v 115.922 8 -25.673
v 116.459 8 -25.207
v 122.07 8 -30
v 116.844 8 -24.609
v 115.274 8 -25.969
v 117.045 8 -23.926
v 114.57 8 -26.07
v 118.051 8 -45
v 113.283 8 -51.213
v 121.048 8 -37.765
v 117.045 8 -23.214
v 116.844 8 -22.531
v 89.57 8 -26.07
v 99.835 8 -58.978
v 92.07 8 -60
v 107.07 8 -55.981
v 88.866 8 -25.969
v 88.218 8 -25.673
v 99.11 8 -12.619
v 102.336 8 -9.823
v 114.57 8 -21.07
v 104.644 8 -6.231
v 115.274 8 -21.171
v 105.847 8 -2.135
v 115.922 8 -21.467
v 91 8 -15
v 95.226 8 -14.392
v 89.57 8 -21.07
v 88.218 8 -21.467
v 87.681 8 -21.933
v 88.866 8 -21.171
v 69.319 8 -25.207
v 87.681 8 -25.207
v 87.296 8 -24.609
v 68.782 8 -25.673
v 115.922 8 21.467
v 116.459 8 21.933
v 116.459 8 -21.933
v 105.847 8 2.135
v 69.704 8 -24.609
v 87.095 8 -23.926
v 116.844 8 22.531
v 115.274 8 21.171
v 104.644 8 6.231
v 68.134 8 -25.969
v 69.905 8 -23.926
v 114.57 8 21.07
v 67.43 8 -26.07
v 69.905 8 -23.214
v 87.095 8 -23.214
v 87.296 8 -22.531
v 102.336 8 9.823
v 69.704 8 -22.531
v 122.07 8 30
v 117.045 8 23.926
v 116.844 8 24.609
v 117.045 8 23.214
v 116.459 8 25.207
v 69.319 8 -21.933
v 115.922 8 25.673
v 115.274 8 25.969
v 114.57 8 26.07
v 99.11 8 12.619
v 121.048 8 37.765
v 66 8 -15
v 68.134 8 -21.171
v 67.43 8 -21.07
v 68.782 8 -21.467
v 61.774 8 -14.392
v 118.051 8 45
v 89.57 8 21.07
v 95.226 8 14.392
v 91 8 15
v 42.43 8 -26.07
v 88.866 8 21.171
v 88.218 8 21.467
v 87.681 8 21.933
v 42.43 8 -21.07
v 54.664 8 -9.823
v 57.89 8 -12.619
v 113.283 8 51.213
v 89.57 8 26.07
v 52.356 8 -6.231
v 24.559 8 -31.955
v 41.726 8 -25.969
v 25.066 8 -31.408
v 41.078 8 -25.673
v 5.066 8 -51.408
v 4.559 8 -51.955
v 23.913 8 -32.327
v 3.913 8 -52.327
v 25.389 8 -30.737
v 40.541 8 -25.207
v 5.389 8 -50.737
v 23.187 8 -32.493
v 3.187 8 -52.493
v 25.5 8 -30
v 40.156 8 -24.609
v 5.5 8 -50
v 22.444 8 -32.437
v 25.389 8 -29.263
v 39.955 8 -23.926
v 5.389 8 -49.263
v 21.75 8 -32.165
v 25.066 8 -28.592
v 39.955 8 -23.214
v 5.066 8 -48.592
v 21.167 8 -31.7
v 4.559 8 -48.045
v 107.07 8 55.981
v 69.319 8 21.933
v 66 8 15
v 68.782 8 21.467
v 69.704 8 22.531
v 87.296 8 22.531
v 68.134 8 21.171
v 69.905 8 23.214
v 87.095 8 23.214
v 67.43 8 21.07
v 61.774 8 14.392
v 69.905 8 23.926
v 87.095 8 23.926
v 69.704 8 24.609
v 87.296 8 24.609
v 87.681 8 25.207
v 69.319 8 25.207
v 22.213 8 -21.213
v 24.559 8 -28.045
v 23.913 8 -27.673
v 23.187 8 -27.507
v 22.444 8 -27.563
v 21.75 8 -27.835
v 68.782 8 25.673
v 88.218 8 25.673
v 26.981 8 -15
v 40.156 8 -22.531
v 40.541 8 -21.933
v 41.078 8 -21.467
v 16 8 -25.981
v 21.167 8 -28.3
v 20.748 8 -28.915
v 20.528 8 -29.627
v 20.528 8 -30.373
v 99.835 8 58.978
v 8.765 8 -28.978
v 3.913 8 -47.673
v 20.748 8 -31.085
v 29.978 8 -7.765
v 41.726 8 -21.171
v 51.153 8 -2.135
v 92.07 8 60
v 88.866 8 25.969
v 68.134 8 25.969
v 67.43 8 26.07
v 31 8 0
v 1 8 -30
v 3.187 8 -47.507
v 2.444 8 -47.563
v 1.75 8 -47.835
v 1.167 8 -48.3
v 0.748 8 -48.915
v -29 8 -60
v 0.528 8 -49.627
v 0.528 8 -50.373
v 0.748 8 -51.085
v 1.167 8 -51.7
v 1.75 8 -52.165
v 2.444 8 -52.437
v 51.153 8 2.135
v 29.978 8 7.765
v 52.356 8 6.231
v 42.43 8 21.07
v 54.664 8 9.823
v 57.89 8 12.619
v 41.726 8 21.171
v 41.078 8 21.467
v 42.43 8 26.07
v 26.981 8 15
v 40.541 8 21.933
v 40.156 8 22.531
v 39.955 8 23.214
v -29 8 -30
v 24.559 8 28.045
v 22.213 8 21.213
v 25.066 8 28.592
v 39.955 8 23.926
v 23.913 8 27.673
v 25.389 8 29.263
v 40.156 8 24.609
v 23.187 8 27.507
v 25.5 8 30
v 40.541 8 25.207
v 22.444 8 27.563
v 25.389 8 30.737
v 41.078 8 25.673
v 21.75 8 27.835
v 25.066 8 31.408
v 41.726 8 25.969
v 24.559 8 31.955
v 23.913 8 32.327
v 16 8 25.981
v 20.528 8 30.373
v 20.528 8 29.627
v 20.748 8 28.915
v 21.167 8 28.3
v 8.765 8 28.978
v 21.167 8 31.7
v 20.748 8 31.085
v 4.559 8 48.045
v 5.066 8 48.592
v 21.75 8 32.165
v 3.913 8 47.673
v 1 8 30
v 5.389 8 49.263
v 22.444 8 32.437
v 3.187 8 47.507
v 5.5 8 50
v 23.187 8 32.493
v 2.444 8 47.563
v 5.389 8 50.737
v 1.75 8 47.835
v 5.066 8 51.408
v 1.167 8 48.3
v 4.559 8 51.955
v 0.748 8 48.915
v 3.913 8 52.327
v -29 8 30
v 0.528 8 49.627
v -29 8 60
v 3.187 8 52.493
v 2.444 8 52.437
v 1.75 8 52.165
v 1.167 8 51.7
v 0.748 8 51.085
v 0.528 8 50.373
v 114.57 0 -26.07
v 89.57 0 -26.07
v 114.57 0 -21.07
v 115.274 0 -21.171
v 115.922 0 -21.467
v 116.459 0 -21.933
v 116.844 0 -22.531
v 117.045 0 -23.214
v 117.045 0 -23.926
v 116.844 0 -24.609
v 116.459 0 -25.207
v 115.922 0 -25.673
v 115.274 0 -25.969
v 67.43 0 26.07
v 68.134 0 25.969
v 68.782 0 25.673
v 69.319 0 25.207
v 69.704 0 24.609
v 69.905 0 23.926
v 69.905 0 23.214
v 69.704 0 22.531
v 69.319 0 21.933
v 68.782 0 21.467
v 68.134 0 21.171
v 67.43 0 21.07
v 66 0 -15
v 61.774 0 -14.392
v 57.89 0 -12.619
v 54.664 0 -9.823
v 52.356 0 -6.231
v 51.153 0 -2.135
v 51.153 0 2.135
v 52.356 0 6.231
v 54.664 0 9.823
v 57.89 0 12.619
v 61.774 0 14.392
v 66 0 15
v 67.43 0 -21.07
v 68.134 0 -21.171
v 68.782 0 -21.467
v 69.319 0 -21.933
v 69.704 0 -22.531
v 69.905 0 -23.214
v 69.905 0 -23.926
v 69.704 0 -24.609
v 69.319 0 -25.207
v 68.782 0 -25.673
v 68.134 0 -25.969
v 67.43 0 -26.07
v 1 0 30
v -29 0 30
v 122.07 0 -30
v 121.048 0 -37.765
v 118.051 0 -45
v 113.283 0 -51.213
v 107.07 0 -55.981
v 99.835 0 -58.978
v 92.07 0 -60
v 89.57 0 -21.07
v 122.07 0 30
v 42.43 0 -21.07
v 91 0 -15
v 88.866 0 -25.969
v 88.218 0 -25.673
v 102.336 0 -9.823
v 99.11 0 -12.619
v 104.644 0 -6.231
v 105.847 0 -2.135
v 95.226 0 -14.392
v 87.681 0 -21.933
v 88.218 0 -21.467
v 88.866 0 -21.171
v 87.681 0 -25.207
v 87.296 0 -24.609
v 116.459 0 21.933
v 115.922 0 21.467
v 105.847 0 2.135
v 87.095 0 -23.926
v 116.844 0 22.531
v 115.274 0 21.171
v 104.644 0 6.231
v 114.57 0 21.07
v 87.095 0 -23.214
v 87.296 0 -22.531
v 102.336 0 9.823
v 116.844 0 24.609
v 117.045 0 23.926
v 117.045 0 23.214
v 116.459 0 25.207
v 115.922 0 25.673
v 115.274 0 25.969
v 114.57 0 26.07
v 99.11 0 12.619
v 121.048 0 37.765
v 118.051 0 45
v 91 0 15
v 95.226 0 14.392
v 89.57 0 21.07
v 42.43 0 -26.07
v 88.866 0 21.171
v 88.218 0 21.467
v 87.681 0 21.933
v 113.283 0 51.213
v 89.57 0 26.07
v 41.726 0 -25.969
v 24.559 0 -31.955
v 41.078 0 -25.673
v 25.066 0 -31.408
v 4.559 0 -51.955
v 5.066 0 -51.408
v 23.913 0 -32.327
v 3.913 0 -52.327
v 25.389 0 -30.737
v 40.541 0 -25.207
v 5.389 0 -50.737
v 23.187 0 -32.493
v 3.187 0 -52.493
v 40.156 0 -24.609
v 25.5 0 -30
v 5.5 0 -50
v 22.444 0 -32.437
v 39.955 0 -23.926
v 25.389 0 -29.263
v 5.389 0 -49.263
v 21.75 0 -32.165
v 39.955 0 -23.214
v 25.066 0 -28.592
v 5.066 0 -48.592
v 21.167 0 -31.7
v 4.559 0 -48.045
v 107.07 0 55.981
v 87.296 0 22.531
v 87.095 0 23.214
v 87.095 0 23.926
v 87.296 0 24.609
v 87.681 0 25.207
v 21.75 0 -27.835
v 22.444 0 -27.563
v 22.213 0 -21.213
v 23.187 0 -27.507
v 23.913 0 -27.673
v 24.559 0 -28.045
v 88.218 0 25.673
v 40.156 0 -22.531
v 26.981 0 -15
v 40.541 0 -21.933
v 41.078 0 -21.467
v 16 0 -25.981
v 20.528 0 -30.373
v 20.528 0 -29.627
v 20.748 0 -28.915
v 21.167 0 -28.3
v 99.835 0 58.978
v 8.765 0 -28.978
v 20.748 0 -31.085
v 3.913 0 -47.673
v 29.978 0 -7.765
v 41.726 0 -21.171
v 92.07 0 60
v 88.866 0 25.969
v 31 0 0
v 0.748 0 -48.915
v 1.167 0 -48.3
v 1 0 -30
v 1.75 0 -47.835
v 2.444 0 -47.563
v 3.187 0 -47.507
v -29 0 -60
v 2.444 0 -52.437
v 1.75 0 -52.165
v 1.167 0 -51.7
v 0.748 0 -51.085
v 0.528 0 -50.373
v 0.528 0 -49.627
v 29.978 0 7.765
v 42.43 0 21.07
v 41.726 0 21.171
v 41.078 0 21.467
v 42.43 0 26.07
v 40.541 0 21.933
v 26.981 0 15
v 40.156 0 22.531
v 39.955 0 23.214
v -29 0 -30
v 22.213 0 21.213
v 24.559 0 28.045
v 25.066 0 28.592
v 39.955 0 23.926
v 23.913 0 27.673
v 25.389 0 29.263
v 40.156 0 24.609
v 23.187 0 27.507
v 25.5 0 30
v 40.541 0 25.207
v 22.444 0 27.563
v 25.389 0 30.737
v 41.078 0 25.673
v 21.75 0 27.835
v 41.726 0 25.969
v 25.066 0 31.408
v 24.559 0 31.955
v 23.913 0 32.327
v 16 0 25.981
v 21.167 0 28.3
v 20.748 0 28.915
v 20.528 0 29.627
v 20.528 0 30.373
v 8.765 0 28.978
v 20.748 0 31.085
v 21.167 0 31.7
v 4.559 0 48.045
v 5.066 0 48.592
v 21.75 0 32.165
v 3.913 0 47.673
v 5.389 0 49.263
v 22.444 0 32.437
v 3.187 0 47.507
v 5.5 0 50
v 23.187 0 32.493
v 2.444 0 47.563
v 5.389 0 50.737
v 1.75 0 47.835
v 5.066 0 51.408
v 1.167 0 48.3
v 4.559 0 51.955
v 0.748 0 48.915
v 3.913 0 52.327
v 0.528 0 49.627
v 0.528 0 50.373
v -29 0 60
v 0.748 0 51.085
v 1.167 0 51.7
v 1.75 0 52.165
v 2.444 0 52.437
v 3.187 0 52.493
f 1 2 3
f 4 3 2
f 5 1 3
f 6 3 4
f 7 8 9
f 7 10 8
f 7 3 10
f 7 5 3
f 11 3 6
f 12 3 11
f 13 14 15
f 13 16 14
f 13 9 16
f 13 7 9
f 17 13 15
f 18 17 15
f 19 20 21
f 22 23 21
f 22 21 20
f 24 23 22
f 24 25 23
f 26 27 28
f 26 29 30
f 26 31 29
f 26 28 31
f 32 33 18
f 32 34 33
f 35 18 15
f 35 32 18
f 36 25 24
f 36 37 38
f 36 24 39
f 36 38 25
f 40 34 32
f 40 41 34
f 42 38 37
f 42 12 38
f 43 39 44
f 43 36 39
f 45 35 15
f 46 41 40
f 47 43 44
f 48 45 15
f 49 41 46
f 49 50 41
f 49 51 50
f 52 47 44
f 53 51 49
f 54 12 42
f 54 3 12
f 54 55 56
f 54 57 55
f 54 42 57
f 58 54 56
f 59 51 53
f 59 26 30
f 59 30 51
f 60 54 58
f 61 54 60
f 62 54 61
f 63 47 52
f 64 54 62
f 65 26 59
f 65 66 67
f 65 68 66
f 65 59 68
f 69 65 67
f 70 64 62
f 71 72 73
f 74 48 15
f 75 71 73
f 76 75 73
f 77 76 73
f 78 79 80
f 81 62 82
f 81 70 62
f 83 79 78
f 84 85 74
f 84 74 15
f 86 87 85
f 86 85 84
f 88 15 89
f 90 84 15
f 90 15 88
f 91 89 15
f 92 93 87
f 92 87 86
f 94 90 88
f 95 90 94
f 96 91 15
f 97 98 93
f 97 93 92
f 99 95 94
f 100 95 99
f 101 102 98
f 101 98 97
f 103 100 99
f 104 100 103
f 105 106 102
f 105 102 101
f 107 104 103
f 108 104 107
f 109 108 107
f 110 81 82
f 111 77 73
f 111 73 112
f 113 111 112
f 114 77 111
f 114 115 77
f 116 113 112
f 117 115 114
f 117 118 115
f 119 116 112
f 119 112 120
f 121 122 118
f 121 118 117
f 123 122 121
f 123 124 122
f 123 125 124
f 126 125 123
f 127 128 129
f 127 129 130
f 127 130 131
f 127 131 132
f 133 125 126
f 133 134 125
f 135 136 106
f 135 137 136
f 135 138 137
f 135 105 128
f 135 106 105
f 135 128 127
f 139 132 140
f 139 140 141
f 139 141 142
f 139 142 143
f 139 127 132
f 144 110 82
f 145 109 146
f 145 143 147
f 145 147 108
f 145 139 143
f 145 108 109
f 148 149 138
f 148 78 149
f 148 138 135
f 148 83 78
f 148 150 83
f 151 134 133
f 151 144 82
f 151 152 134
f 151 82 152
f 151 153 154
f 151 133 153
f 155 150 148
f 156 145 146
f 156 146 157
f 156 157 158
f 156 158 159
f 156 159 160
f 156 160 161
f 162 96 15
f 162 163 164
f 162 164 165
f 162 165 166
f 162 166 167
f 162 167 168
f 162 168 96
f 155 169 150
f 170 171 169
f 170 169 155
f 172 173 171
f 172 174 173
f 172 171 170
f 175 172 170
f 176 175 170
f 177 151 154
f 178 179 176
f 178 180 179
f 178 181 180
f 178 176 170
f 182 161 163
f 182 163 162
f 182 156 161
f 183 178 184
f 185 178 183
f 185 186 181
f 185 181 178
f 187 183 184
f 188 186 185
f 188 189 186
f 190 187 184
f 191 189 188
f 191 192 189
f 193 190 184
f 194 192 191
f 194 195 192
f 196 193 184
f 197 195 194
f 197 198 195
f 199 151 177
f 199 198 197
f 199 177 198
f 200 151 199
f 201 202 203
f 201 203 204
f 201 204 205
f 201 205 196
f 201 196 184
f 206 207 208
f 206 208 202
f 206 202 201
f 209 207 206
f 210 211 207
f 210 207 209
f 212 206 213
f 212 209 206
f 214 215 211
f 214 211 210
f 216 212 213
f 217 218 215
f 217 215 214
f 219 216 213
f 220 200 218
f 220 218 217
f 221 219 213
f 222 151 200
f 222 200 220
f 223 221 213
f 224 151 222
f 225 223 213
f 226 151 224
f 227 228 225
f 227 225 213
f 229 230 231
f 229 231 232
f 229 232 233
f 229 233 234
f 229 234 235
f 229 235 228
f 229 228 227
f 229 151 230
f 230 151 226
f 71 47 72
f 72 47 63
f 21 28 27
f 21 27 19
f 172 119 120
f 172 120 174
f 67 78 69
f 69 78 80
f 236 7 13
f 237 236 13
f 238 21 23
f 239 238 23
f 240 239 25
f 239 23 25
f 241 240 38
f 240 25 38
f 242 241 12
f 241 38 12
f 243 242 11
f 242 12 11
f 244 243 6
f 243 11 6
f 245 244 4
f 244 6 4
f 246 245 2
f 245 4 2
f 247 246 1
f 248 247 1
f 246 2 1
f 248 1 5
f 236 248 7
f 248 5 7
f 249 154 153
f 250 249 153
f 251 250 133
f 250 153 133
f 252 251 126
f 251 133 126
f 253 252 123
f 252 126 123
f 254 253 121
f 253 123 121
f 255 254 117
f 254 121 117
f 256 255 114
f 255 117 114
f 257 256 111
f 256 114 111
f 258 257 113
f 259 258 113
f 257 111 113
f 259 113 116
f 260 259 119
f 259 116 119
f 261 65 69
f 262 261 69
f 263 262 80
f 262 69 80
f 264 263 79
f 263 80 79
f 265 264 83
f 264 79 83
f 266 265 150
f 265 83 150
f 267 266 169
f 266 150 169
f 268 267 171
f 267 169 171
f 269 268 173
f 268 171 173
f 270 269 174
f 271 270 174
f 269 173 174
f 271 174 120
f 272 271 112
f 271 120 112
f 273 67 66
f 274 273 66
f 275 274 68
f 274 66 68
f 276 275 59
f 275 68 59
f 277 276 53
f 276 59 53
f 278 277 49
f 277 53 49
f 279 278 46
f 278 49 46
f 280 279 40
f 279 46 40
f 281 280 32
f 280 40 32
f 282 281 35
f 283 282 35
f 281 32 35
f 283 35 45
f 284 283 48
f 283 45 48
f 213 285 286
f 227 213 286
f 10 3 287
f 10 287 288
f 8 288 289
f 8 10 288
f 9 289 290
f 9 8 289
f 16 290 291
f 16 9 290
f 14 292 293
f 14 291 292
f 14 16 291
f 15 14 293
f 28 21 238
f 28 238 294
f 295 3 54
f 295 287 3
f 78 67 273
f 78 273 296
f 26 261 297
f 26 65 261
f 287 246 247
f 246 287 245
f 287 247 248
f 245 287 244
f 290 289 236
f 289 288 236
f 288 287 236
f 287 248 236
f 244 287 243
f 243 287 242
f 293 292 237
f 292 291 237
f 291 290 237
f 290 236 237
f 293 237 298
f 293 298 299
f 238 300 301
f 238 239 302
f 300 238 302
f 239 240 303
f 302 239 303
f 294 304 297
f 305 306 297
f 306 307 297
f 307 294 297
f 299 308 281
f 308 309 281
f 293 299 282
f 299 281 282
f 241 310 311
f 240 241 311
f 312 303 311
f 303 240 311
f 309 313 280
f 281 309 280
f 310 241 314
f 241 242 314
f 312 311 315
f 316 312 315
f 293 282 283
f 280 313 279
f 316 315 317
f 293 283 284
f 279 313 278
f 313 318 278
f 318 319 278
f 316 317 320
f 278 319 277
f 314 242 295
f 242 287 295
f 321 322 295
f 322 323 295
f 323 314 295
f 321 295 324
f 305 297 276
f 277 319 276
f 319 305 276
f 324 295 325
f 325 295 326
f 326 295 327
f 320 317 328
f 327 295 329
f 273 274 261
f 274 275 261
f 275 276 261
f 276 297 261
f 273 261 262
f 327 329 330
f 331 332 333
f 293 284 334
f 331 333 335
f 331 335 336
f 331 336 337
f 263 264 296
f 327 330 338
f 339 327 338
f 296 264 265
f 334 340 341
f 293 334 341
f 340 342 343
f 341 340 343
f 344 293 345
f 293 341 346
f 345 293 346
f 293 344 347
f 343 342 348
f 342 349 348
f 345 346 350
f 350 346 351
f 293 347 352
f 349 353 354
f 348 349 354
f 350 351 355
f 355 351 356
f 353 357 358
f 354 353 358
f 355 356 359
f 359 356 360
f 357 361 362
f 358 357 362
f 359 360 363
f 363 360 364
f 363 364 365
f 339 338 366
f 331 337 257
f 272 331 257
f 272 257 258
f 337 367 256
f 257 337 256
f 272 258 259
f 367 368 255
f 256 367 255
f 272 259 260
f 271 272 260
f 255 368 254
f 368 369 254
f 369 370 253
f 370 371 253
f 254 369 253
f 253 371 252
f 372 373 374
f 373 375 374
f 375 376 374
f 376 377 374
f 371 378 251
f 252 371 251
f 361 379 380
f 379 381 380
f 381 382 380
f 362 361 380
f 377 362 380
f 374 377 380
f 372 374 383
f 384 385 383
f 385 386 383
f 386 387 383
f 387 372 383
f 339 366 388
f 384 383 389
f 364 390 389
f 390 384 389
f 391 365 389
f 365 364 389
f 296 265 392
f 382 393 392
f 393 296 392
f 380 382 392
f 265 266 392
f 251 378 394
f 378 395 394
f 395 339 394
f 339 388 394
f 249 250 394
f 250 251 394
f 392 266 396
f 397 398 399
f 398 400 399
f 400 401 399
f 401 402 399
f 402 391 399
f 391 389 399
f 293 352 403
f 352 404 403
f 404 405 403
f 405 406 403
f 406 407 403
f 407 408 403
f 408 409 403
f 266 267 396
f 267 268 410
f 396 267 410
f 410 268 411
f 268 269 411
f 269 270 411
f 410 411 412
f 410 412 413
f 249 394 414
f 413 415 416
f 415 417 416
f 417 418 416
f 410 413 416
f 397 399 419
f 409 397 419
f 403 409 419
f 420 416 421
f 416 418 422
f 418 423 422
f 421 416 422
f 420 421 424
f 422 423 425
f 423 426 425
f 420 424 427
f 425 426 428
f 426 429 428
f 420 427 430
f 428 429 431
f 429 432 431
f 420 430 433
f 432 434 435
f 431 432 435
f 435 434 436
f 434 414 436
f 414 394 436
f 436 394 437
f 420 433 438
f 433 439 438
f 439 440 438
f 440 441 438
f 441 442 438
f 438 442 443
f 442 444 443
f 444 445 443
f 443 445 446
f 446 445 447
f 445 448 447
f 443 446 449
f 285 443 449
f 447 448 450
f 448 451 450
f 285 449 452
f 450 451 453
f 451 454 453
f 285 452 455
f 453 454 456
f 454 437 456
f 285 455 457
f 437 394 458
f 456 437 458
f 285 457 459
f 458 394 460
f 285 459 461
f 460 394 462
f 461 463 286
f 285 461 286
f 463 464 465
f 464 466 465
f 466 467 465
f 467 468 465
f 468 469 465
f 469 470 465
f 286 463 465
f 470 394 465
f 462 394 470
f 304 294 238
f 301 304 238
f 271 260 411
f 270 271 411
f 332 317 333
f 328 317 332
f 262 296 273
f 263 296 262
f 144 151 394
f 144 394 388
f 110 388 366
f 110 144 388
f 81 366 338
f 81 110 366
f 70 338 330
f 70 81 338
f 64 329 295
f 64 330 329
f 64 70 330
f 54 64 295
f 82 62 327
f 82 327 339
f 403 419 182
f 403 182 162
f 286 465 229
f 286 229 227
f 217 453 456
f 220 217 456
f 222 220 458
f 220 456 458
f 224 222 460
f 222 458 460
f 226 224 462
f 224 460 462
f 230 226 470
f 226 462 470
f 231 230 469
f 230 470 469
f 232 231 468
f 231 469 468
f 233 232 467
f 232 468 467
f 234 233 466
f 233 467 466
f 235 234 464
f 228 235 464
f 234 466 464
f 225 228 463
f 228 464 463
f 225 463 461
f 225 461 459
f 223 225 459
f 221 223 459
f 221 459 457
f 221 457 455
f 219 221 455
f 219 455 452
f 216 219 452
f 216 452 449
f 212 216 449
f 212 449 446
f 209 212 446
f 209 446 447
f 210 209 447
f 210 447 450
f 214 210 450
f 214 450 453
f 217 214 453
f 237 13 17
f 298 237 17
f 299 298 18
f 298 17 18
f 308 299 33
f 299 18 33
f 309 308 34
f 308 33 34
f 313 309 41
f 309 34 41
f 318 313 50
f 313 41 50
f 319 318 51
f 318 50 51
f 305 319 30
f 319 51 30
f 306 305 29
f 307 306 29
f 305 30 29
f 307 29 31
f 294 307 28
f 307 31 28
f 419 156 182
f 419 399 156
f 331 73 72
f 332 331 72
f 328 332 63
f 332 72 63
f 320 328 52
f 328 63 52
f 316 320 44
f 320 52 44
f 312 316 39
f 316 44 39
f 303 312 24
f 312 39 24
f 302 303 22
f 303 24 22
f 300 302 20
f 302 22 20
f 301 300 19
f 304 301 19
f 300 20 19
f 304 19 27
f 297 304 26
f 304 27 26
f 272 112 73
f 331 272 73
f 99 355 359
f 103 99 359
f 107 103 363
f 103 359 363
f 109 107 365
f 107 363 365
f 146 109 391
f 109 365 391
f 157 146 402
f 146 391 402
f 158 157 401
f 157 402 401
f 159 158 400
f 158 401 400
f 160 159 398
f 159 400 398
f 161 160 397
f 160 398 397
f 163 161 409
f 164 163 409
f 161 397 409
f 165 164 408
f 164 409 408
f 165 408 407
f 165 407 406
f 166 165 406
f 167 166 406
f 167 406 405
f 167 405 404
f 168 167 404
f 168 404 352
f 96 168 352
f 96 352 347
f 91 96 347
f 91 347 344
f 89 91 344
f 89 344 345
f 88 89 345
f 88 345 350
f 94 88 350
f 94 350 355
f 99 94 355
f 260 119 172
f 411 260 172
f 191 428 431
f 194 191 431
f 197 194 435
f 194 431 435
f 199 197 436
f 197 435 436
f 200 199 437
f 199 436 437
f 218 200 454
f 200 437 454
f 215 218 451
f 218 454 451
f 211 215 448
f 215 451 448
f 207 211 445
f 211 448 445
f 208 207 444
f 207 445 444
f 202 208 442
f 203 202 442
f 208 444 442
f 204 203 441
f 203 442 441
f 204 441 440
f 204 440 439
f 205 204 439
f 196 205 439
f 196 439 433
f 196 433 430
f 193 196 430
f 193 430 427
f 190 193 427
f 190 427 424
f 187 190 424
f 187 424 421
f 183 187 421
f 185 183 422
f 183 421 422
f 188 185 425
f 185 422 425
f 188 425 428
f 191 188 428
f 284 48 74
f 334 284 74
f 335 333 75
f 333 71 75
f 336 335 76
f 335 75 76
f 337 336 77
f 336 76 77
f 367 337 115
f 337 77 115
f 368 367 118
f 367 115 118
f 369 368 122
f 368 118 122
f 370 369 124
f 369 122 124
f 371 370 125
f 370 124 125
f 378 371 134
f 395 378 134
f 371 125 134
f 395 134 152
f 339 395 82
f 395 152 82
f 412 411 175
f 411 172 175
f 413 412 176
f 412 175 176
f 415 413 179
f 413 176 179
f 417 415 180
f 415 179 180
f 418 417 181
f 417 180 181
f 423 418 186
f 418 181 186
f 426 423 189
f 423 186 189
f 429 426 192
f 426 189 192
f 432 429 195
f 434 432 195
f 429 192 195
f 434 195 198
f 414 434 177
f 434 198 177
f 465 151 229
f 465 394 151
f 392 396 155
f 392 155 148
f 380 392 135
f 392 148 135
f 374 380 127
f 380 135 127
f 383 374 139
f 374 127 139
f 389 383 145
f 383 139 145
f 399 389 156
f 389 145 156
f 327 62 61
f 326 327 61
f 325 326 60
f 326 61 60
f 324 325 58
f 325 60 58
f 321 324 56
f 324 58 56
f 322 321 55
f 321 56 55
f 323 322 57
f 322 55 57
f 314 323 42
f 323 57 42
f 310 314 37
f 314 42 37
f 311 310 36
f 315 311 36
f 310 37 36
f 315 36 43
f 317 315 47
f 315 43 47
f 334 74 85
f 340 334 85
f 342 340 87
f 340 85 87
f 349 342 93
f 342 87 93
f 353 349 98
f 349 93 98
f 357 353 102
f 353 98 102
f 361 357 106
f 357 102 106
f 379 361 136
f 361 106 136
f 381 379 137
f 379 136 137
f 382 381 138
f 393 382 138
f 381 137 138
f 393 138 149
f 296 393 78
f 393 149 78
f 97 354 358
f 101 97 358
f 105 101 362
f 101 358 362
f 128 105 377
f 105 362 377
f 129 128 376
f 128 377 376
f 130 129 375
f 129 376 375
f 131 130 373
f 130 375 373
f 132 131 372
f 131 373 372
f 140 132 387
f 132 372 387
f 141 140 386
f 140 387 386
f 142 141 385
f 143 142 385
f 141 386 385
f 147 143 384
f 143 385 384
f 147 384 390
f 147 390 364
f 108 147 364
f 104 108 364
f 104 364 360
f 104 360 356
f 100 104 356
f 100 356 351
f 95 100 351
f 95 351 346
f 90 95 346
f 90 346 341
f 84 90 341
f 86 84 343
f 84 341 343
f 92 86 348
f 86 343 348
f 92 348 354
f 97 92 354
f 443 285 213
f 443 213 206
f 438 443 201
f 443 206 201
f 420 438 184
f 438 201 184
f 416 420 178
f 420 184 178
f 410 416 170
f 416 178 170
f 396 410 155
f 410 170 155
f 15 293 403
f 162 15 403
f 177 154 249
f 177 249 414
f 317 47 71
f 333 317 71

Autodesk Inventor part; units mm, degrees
ref_plane "YZ Plane" through (0, 0, 0) normal (1, 0, 0) x (0, 1, 0)
ref_plane "XZ Plane" through (0, 0, 0) normal (0, 1, 0) x (-1, 0, 0)
ref_plane "XY Plane" through (0, 0, 0) normal (0, 0, 1) x (1, 0, 0)
sketch "Szkic1" plane through (0, 0, 0) normal (0, 1, 0) x (-1, 0, 0)
  line L0 (-28, -60) -> (29, -60)
  line L1 (-28, 60) -> (29, 60)
  line L2 (-28, 60) -> (-36, 60)
  line L3 (-36, -60) -> (-28, -60)
  circle A0 centre (-81, 0) radius 12.5
  circle A1 centre (0, 0) radius 24
  line L4 (-111, -60) -> (-36, -60)
  line L5 (-111, 60) -> (-36, 60)
  line L6 (29, 60) -> (29, -60)
  line L7 (-31, -30) -> (29, -30)
  line L8 (-31, 30) -> (29, 30)
  circle A2 centre (-81, 0) radius 15
  line L9 (-116, -60) -> (-111, -60)
  line L10 (-116, 60) -> (-111, 60)
  line L11 (-116, -60) -> (-119.57, -60)
  line L12 (-119.57, 60) -> (-116, 60)
  line L13 (-119.57, -60) -> (-122.07, -60)
  line L14 (-122.07, -60) -> (-122.07, 60)
  line L15 (-122.07, 60) -> (-119.57, 60)
  line L16 (-31, -30) -> (-31, 30)
  dimension "d0" = 30
extrude "Wyciągnięcie proste1" add sketch "Szkic1" along normal blind 8 contours L3 L4 L9 L11 L13 L14 L15 L12 L10 L5 L2 L1 L6 L8 L16 L7 L0
sketch "Szkic3" plane through (0, 8, 0) normal (0, 1, 0) x (1, 0, 0)
  line L0 (81, 15) -> (111, 15)
  line L1 (81, -15) -> (111, -15)
  arc A0 (11, -30) -> (11, 30) centre (11, 0) ccw projected
  circle A1 centre (81, 0) radius 15 projected
  arc A2 (66, 15) -> (66, -15) centre (66, 0) ccw
  line L2 (81, 15) -> (66, 15)
  line L3 (81, -15) -> (66, -15)
  arc A3 (91, -15) -> (91, 15) centre (91, 0) ccw
  line L4 (116, -60) -> (116, 60) projected
  line L5 (111, 15) -> (116, 15)
  line L6 (111, -15) -> (116, -15)
  point P0 (0, 0)
  point P1 (116, -30)
  point P2 (116, 30)
extrude "Wyciągnięcie proste4" cut sketch "Szkic3" against normal up to next contours L0 A3 L1 A1 | A1 | A1 L3 A2 L2
sketch "Szkic4" plane through (0, 8, 0) normal (0, 1, 0) x (1, 0, 0)
  line L0 (86, -60) -> (-29, -60)
  line L1 (-29, -60) -> (-29, -30)
  line L2 (-29, -30) -> (11, -30)
  arc A0 (11, -30) -> (11, 30) centre (11, 0) ccw
  line L3 (11, 30) -> (-29, 30)
  line L4 (-29, 30) -> (-29, 60)
  line L5 (-29, 60) -> (86, 60)
  circle A1 centre (81, 0) radius 4
  circle A2 centre (0, 0) radius 5
  circle A3 centre (104.57, -23.57) radius 2.5
  circle A4 centre (57.43, -23.57) radius 2.5
  circle A5 centre (104.57, 23.57) radius 2.5
  circle A6 centre (57.43, 23.57) radius 2.5
  line L6 (122.07, 60) -> (-29, 60) projected
  line L7 (-29, 60) -> (-29, 30) projected
  line L8 (104.57, 23.57) -> (114.57, 23.57)
  line L9 (104.57, 23.57) -> (89.57, 23.57)
  arc A7 (114.57, 21.07) -> (114.57, 26.07) centre (114.57, 23.57) ccw
  arc A8 (89.57, 26.07) -> (89.57, 21.07) centre (89.57, 23.57) ccw
  line L10 (104.57, 26.07) -> (114.57, 26.07)
  line L11 (104.57, 21.07) -> (114.57, 21.07)
  line L12 (104.57, 26.07) -> (89.57, 26.07)
  line L13 (104.57, 21.07) -> (89.57, 21.07)
  circle A9 centre (104.57, -23.57) radius 2.5
  line L14 (104.57, -23.57) -> (114.57, -23.57)
  line L15 (104.57, -23.57) -> (89.57, -23.57)
  arc A10 (114.57, -26.07) -> (114.57, -21.07) centre (114.57, -23.57) ccw
  arc A11 (89.57, -21.07) -> (89.57, -26.07) centre (89.57, -23.57) ccw
  line L16 (104.57, -21.07) -> (114.57, -21.07)
  line L17 (104.57, -26.07) -> (114.57, -26.07)
  line L18 (104.57, -21.07) -> (89.57, -21.07)
  line L19 (104.57, -26.07) -> (89.57, -26.07)
  circle A12 centre (57.43, -23.57) radius 2.5
  line L20 (57.43, -23.57) -> (67.43, -23.57)
  line L21 (57.43, -23.57) -> (42.43, -23.57)
  arc A13 (67.43, -26.07) -> (67.43, -21.07) centre (67.43, -23.57) ccw
  arc A14 (42.43, -21.07) -> (42.43, -26.07) centre (42.43, -23.57) ccw
  line L22 (57.43, -21.07) -> (67.43, -21.07)
  line L23 (57.43, -26.07) -> (67.43, -26.07)
  line L24 (57.43, -21.07) -> (42.43, -21.07)
  line L25 (57.43, -26.07) -> (42.43, -26.07)
  circle A15 centre (57.43, 23.57) radius 2.5
  line L26 (57.43, 23.57) -> (67.43, 23.57)
  line L27 (57.43, 23.57) -> (42.43, 23.57)
  arc A16 (67.43, 21.07) -> (67.43, 26.07) centre (67.43, 23.57) ccw
  arc A17 (42.43, 26.07) -> (42.43, 21.07) centre (42.43, 23.57) ccw
  line L28 (57.43, 26.07) -> (67.43, 26.07)
  line L29 (57.43, 21.07) -> (67.43, 21.07)
  line L30 (57.43, 26.07) -> (42.43, 26.07)
  line L31 (57.43, 21.07) -> (42.43, 21.07)
  point P0 (0, 0)
  point P1 (86, 60)
  point P2 (116, 60)
  point P3 (119.57, 60)
  dimension "d17" = 10
  dimension "d18" = 15
  dimension "d20" = 2.5
  dimension "d22" = 10
  dimension "d23" = 15
  dimension "d24" = 2.5
  dimension "d25" = 10
  dimension "d26" = 15
  dimension "d27" = 2.5
  dimension "d28" = 10
  dimension "d29" = 15
  dimension "d30" = 2.5
extrude "Wyciągnięcie proste5" cut sketch "Szkic4" against normal up to next contours L14 L15 A3 | A3 L16 A10 L17 | A3 L15 L14 | A3 L19 A11 L18 | L20 L21 A4 | A4 L22 A13 L23 | A4 L21 L20 | A4 L25 A14 L24 | L8 L9 A5 | A5 L10 A7 L11 | A5 L9 L8 | A5 L13 A8 L12 | L26 L27 A6 | A6 L28 A16 L29 | A6 L27 L26 | A6 L31 A17 L30
fillet "Zaokrąglenie5" radius 30 2 edges at (31, 4, -30) (31, 4, 30)
fillet "Zaokrąglenie6" radius 30 2 edges at (122.07, 4, 60) (122.07, 4, -60)
sketch "Szkic5" plane through (0, 0, 0) normal (0, -1, 0) x (1, 0, 0)
  line L0 (122.07, 30) -> (122.07, -30)
  arc A0 (122.07, 30) -> (92.07, 60) centre (92.07, 30) ccw
  line L1 (-29, 60) -> (92.07, 60)
  line L2 (-29, 30) -> (-29, 60)
  arc A1 (1, -30) -> (1, 30) centre (1, 0) ccw
  line L3 (1, 30) -> (-29, 30)
  line L4 (-29, -30) -> (1, -30)
  line L5 (-29, -60) -> (-29, -30)
  line L6 (92.07, -60) -> (-29, -60)
  arc A2 (92.07, -60) -> (122.07, -30) centre (92.07, -30) ccw
  circle A3 centre (0, 0) radius 24
  arc A4 (-16.7697, 48.5) -> (-16.7697, 51.5) centre (-12, 50) ccw
  circle A5 centre (-19, 16) radius 2.5
  line L7 (-16.7697, 48.5) -> (-29, 48.5)
  line L8 (-29, 51.5) -> (-16.7697, 51.5)
  circle A6 centre (-12, -50) radius 5
  line L9 (-29, -48.5) -> (-16.7697, -48.5)
  line L10 (-16.7697, -51.5) -> (-29, -51.5)
  circle A7 centre (-19, -16) radius 2.5
  line L11 (36, -60) -> (36, 60)
  line L12 (-29, 60) -> (92.07, 60) projected
  line L13 (-29, 30) -> (-29, 60) projected
  line L14 (36, 60) -> (28, 60)
  line L15 (28, 60) -> (28, -60)
  line L16 (92.07, -60) -> (-29, -60) projected
  line L17 (28, -60) -> (18, -60)
  line L18 (18, -60) -> (18, 60)
  line L19 (18, -60) -> (18, -30)
  line L20 (18, 60) -> (18, 30)
  circle A8 centre (18, 30) radius 2.5
  circle A9 centre (18, -30) radius 2.5
  line L21 (18, -60) -> (3, -60)
  line L22 (3, -60) -> (3, 60)
  line L23 (3, 60) -> (3, 50)
  line L24 (3, -60) -> (3, -50)
  circle A10 centre (3, 50) radius 2.5
  circle A11 centre (3, -50) radius 2.5
  line L25 (28, -60) -> (23, -60)
  line L26 (92.07, -60) -> (-29, -60) projected
  line L27 (23, -60) -> (23, 60)
  line L28 (-29, 60) -> (92.07, 60) projected
  circle A12 centre (23, 30) radius 2.5
  circle A13 centre (23, -30) radius 2.5
  point P0 (0, 0)
  dimension "d36" = 8
  dimension "d37" = 10
  dimension "d38" = 30
  dimension "d39" = 30
  dimension "d40" = 5
  dimension "d41" = 5
  dimension "d42" = 15
  dimension "d43" = 10
  dimension "d44" = 10
  dimension "d45" = 5
  dimension "d46" = 5
  dimension "d49" = 5
  dimension "d50" = 5
  dimension "d51" = 5
extrude "Wyciągnięcie proste7" cut sketch "Szkic5" against normal up to next contours A12 L27 | L27 A12 | A13 L27 | L27 A13 | A10 L22 | L22 A10 | A11 L22 | L22 A11
properties part number "Uchwyt silnika krokowego osi Zi"
